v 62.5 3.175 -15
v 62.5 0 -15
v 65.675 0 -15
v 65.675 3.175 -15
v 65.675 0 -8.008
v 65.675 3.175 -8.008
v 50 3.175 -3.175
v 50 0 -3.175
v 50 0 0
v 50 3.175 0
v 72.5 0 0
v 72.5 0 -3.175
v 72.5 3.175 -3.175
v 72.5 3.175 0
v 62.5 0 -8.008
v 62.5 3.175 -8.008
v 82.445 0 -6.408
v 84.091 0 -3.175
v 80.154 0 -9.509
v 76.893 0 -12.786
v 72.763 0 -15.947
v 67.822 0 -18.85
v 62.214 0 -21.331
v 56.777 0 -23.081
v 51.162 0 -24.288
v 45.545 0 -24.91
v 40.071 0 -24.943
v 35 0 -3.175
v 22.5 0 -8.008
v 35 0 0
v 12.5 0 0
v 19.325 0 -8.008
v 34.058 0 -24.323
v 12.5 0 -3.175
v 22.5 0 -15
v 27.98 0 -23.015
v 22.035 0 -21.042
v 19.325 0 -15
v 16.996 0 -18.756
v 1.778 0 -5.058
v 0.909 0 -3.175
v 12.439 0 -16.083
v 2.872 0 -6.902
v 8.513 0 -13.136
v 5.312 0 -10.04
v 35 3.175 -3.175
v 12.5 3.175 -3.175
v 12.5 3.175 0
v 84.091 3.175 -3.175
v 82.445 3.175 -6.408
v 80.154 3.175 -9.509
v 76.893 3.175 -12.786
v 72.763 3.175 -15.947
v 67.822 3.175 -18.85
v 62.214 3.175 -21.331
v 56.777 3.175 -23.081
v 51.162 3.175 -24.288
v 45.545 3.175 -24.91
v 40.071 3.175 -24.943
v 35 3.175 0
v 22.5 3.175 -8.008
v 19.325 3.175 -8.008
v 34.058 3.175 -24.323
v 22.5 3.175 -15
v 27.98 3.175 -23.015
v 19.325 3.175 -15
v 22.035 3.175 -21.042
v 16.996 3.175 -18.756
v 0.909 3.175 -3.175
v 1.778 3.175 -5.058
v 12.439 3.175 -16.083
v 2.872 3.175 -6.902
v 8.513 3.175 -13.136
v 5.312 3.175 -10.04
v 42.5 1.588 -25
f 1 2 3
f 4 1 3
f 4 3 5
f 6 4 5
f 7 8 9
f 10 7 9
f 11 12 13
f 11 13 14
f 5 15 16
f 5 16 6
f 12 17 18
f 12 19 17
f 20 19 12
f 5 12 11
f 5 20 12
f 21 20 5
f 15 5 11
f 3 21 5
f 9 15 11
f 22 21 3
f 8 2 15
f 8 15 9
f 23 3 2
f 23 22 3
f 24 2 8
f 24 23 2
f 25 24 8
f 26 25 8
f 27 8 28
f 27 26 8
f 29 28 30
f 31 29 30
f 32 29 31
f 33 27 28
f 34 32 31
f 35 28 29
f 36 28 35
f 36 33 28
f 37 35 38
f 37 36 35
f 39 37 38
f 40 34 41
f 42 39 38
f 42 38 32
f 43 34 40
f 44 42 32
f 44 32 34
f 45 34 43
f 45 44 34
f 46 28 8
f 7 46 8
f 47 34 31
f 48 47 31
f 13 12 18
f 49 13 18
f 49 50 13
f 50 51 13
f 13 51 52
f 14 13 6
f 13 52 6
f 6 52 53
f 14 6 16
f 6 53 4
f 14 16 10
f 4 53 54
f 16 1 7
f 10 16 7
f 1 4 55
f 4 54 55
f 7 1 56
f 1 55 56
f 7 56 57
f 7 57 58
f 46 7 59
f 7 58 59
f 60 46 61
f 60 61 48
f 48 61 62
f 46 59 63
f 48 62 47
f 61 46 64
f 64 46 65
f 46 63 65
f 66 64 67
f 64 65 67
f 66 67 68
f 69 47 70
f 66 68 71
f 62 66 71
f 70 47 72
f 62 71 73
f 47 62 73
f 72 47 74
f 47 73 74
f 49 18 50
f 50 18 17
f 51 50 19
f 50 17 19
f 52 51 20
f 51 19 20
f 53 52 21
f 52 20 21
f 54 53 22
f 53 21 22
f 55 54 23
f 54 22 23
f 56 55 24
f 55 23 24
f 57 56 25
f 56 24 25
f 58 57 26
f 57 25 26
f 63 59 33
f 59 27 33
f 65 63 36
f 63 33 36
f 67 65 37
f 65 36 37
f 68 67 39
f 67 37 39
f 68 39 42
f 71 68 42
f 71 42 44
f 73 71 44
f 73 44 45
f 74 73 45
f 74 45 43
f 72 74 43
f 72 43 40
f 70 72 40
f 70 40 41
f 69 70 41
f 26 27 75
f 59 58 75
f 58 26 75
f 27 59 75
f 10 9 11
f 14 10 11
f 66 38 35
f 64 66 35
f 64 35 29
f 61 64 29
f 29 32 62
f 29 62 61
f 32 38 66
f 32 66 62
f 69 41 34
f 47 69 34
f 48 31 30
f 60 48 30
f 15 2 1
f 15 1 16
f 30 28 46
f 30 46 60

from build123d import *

# Parameters (mm, degrees)
BOSS_EXTRUDE1_DEPTH = 3.175
SKETCH2_W           = 3.175
SKETCH2_H           = 6.992
SKETCH2_W_2         = 12.5
SKETCH2_H_2         = 3.175
SKETCH2_W_3         = 15
CUT_EXTRUDE1_DEPTH  = 4.1750001


with BuildPart() as part:
    # Sketch1 → Boss-Extrude1 (new body)
    with BuildSketch(Plane(origin=(0, 0, 0), x_dir=(1, 0, 0), z_dir=(0, 1, 0))):
        with BuildLine():
            add(Edge.make_bspline(
                [(0, 0), (2.315309036, 13.13077004), (22.407654518, 25), (42.5, 25)],
                knots=[0, 0, 0, 0, 0.5, 0.5, 0.5, 0.5], degree=3))
            Line((0, 0), (42.5, 0))
            Line((42.5, 0), (42.5, 25))
        make_face()
        with BuildLine():
            Line((42.5, 25), (42.5, 0))
            Line((42.5, 0), (85, 0))
            add(Edge.make_bspline(
                [(42.5, 25), (62.592345482, 25), (82.684690964, 13.13077004), (85, 0)],
                knots=[0.5, 0.5, 0.5, 0.5, 1, 1, 1, 1], degree=3))
        make_face()
    extrude(amount=BOSS_EXTRUDE1_DEPTH)

    # Sketch2 → Cut-Extrude1 (cut, through all)
    with BuildSketch(Plane.XZ):
        with Locations((64.0875, -11.504)):
            Rectangle(SKETCH2_W, SKETCH2_H)
        with Locations((20.9125, -11.504)):
            Rectangle(SKETCH2_W, SKETCH2_H)
        with Locations((78.75, -1.5875)):
            Rectangle(SKETCH2_W_2, SKETCH2_H_2)
        with Locations((6.25, -1.5875)):
            Rectangle(SKETCH2_W_2, SKETCH2_H_2)
        with Locations((42.5, -1.5875)):
            Rectangle(SKETCH2_W_3, SKETCH2_H_2)
    extrude(amount=-CUT_EXTRUDE1_DEPTH, mode=Mode.SUBTRACT)


solid = part.part
